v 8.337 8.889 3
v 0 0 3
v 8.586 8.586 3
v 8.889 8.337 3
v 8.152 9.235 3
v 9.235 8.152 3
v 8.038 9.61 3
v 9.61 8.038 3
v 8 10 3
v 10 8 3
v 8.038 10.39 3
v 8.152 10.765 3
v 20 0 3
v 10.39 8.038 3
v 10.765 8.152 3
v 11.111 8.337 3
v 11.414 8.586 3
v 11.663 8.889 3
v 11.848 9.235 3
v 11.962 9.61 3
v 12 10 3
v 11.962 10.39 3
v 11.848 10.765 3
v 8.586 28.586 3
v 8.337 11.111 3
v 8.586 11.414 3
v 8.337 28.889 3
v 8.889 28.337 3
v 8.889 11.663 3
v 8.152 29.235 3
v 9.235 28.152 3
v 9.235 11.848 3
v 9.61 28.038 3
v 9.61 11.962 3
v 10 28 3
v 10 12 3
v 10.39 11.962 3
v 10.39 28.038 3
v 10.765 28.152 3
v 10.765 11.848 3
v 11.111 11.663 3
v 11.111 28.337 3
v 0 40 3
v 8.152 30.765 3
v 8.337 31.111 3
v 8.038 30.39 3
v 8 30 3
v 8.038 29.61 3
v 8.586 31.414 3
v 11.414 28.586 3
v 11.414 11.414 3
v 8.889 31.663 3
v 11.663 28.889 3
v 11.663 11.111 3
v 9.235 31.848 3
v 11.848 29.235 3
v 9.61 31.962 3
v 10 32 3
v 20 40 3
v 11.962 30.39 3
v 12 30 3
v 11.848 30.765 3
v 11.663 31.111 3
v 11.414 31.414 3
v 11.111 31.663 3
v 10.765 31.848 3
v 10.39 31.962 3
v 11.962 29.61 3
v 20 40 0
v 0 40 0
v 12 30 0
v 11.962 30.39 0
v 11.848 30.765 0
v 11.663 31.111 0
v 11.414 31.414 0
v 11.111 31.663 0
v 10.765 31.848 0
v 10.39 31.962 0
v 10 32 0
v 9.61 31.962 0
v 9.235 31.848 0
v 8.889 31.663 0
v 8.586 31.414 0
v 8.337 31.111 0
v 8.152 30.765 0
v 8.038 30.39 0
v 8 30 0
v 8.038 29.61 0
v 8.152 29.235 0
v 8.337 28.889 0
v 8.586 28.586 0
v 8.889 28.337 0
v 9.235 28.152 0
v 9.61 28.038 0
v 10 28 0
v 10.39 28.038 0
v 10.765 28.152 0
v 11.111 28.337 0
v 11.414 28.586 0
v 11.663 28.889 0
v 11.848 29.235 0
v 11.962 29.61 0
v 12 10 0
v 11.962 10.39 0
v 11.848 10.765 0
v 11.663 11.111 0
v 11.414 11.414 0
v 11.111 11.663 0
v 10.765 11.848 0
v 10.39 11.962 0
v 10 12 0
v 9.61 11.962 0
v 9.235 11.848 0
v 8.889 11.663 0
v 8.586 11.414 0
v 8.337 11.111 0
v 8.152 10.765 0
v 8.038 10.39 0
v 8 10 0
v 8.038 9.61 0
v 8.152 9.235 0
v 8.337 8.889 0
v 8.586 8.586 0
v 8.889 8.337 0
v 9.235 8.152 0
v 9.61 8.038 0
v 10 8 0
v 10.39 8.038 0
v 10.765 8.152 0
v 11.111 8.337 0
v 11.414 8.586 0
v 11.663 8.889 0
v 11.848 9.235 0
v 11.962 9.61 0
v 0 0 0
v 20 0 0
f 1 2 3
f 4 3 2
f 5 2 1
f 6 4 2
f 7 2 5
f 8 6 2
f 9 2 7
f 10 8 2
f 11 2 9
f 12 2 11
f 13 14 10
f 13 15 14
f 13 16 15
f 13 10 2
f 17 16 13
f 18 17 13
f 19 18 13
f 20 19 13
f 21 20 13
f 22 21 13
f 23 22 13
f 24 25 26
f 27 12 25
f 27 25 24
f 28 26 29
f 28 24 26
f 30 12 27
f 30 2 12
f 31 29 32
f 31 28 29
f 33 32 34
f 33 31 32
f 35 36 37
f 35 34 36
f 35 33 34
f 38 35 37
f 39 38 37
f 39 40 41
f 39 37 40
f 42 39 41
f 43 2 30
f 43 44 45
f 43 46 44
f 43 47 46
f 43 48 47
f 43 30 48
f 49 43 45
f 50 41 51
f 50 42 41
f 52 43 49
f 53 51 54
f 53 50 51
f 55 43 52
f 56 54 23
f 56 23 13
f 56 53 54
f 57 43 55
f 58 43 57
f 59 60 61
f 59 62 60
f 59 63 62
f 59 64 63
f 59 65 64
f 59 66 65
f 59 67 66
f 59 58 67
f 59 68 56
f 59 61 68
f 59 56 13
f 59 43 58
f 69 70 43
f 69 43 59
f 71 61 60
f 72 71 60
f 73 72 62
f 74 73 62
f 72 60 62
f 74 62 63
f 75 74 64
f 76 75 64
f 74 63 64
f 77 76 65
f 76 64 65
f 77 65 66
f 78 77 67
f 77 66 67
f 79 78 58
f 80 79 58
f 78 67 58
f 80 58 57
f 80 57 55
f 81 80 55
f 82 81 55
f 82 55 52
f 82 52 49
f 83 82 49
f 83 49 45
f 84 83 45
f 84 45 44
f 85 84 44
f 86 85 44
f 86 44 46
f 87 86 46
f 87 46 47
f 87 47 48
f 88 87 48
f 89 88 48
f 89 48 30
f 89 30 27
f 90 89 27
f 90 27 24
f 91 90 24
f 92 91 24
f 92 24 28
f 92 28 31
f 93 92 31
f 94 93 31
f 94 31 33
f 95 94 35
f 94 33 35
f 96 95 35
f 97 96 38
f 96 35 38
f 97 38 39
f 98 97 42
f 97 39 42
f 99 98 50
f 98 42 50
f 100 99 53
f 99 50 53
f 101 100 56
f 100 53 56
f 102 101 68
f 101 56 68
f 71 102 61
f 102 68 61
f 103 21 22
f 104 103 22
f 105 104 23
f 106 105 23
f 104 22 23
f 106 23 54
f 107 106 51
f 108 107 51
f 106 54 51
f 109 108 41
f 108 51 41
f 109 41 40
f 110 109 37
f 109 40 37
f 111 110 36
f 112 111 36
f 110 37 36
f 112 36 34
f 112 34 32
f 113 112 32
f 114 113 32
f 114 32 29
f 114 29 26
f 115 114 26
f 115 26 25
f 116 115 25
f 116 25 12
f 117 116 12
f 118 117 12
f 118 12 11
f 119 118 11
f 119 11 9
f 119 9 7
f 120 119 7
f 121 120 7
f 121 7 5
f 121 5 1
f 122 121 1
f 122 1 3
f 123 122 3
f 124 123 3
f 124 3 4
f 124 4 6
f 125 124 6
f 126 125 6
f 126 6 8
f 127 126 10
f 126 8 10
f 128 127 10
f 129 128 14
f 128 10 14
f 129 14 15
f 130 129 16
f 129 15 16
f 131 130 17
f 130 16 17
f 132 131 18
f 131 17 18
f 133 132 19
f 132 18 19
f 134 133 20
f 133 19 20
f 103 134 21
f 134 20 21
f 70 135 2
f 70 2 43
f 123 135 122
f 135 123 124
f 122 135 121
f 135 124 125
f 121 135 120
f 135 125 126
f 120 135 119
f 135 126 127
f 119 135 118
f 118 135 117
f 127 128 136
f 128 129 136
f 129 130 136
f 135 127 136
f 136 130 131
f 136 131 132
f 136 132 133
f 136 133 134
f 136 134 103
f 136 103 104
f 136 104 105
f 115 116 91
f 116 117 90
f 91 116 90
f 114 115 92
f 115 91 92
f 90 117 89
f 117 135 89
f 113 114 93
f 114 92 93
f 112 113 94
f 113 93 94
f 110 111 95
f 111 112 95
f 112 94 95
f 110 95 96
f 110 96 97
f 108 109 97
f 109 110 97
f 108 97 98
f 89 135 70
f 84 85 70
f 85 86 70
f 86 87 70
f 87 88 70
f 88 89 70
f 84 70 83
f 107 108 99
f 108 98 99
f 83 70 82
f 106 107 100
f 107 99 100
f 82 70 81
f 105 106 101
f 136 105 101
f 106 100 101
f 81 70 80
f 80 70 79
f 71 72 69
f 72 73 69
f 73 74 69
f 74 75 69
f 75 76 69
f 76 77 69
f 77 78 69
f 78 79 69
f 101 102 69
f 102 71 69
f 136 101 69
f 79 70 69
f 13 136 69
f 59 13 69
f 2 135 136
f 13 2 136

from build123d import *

# Parameters (mm, degrees)
SKETCH1_W           = 20
SKETCH1_H           = 40
BOSS_EXTRUDE1_DEPTH = 3
SKETCH2_R           = 2
CUT_EXTRUDE1_DEPTH  = 4
SKETCH3_R           = 2
CUT_EXTRUDE2_DEPTH  = 4


with BuildPart() as part:
    # Sketch1 → Boss-Extrude1 (new body)
    with BuildSketch(Plane.XY):
        with Locations((10, 20)):
            Rectangle(SKETCH1_W, SKETCH1_H)
    extrude(amount=BOSS_EXTRUDE1_DEPTH)

    # Sketch2 → Cut-Extrude1 (cut, through all)
    with BuildSketch(Plane.XY.offset(3)):
        with Locations((10, 10)):
            Circle(SKETCH2_R)
    extrude(amount=-CUT_EXTRUDE1_DEPTH, mode=Mode.SUBTRACT)

    # Sketch3 → Cut-Extrude2 (cut, through all)
    with BuildSketch(Plane.XY.offset(3)):
        with Locations((10, 30)):
            Circle(SKETCH3_R)
    extrude(amount=-CUT_EXTRUDE2_DEPTH, mode=Mode.SUBTRACT)


solid = part.part
